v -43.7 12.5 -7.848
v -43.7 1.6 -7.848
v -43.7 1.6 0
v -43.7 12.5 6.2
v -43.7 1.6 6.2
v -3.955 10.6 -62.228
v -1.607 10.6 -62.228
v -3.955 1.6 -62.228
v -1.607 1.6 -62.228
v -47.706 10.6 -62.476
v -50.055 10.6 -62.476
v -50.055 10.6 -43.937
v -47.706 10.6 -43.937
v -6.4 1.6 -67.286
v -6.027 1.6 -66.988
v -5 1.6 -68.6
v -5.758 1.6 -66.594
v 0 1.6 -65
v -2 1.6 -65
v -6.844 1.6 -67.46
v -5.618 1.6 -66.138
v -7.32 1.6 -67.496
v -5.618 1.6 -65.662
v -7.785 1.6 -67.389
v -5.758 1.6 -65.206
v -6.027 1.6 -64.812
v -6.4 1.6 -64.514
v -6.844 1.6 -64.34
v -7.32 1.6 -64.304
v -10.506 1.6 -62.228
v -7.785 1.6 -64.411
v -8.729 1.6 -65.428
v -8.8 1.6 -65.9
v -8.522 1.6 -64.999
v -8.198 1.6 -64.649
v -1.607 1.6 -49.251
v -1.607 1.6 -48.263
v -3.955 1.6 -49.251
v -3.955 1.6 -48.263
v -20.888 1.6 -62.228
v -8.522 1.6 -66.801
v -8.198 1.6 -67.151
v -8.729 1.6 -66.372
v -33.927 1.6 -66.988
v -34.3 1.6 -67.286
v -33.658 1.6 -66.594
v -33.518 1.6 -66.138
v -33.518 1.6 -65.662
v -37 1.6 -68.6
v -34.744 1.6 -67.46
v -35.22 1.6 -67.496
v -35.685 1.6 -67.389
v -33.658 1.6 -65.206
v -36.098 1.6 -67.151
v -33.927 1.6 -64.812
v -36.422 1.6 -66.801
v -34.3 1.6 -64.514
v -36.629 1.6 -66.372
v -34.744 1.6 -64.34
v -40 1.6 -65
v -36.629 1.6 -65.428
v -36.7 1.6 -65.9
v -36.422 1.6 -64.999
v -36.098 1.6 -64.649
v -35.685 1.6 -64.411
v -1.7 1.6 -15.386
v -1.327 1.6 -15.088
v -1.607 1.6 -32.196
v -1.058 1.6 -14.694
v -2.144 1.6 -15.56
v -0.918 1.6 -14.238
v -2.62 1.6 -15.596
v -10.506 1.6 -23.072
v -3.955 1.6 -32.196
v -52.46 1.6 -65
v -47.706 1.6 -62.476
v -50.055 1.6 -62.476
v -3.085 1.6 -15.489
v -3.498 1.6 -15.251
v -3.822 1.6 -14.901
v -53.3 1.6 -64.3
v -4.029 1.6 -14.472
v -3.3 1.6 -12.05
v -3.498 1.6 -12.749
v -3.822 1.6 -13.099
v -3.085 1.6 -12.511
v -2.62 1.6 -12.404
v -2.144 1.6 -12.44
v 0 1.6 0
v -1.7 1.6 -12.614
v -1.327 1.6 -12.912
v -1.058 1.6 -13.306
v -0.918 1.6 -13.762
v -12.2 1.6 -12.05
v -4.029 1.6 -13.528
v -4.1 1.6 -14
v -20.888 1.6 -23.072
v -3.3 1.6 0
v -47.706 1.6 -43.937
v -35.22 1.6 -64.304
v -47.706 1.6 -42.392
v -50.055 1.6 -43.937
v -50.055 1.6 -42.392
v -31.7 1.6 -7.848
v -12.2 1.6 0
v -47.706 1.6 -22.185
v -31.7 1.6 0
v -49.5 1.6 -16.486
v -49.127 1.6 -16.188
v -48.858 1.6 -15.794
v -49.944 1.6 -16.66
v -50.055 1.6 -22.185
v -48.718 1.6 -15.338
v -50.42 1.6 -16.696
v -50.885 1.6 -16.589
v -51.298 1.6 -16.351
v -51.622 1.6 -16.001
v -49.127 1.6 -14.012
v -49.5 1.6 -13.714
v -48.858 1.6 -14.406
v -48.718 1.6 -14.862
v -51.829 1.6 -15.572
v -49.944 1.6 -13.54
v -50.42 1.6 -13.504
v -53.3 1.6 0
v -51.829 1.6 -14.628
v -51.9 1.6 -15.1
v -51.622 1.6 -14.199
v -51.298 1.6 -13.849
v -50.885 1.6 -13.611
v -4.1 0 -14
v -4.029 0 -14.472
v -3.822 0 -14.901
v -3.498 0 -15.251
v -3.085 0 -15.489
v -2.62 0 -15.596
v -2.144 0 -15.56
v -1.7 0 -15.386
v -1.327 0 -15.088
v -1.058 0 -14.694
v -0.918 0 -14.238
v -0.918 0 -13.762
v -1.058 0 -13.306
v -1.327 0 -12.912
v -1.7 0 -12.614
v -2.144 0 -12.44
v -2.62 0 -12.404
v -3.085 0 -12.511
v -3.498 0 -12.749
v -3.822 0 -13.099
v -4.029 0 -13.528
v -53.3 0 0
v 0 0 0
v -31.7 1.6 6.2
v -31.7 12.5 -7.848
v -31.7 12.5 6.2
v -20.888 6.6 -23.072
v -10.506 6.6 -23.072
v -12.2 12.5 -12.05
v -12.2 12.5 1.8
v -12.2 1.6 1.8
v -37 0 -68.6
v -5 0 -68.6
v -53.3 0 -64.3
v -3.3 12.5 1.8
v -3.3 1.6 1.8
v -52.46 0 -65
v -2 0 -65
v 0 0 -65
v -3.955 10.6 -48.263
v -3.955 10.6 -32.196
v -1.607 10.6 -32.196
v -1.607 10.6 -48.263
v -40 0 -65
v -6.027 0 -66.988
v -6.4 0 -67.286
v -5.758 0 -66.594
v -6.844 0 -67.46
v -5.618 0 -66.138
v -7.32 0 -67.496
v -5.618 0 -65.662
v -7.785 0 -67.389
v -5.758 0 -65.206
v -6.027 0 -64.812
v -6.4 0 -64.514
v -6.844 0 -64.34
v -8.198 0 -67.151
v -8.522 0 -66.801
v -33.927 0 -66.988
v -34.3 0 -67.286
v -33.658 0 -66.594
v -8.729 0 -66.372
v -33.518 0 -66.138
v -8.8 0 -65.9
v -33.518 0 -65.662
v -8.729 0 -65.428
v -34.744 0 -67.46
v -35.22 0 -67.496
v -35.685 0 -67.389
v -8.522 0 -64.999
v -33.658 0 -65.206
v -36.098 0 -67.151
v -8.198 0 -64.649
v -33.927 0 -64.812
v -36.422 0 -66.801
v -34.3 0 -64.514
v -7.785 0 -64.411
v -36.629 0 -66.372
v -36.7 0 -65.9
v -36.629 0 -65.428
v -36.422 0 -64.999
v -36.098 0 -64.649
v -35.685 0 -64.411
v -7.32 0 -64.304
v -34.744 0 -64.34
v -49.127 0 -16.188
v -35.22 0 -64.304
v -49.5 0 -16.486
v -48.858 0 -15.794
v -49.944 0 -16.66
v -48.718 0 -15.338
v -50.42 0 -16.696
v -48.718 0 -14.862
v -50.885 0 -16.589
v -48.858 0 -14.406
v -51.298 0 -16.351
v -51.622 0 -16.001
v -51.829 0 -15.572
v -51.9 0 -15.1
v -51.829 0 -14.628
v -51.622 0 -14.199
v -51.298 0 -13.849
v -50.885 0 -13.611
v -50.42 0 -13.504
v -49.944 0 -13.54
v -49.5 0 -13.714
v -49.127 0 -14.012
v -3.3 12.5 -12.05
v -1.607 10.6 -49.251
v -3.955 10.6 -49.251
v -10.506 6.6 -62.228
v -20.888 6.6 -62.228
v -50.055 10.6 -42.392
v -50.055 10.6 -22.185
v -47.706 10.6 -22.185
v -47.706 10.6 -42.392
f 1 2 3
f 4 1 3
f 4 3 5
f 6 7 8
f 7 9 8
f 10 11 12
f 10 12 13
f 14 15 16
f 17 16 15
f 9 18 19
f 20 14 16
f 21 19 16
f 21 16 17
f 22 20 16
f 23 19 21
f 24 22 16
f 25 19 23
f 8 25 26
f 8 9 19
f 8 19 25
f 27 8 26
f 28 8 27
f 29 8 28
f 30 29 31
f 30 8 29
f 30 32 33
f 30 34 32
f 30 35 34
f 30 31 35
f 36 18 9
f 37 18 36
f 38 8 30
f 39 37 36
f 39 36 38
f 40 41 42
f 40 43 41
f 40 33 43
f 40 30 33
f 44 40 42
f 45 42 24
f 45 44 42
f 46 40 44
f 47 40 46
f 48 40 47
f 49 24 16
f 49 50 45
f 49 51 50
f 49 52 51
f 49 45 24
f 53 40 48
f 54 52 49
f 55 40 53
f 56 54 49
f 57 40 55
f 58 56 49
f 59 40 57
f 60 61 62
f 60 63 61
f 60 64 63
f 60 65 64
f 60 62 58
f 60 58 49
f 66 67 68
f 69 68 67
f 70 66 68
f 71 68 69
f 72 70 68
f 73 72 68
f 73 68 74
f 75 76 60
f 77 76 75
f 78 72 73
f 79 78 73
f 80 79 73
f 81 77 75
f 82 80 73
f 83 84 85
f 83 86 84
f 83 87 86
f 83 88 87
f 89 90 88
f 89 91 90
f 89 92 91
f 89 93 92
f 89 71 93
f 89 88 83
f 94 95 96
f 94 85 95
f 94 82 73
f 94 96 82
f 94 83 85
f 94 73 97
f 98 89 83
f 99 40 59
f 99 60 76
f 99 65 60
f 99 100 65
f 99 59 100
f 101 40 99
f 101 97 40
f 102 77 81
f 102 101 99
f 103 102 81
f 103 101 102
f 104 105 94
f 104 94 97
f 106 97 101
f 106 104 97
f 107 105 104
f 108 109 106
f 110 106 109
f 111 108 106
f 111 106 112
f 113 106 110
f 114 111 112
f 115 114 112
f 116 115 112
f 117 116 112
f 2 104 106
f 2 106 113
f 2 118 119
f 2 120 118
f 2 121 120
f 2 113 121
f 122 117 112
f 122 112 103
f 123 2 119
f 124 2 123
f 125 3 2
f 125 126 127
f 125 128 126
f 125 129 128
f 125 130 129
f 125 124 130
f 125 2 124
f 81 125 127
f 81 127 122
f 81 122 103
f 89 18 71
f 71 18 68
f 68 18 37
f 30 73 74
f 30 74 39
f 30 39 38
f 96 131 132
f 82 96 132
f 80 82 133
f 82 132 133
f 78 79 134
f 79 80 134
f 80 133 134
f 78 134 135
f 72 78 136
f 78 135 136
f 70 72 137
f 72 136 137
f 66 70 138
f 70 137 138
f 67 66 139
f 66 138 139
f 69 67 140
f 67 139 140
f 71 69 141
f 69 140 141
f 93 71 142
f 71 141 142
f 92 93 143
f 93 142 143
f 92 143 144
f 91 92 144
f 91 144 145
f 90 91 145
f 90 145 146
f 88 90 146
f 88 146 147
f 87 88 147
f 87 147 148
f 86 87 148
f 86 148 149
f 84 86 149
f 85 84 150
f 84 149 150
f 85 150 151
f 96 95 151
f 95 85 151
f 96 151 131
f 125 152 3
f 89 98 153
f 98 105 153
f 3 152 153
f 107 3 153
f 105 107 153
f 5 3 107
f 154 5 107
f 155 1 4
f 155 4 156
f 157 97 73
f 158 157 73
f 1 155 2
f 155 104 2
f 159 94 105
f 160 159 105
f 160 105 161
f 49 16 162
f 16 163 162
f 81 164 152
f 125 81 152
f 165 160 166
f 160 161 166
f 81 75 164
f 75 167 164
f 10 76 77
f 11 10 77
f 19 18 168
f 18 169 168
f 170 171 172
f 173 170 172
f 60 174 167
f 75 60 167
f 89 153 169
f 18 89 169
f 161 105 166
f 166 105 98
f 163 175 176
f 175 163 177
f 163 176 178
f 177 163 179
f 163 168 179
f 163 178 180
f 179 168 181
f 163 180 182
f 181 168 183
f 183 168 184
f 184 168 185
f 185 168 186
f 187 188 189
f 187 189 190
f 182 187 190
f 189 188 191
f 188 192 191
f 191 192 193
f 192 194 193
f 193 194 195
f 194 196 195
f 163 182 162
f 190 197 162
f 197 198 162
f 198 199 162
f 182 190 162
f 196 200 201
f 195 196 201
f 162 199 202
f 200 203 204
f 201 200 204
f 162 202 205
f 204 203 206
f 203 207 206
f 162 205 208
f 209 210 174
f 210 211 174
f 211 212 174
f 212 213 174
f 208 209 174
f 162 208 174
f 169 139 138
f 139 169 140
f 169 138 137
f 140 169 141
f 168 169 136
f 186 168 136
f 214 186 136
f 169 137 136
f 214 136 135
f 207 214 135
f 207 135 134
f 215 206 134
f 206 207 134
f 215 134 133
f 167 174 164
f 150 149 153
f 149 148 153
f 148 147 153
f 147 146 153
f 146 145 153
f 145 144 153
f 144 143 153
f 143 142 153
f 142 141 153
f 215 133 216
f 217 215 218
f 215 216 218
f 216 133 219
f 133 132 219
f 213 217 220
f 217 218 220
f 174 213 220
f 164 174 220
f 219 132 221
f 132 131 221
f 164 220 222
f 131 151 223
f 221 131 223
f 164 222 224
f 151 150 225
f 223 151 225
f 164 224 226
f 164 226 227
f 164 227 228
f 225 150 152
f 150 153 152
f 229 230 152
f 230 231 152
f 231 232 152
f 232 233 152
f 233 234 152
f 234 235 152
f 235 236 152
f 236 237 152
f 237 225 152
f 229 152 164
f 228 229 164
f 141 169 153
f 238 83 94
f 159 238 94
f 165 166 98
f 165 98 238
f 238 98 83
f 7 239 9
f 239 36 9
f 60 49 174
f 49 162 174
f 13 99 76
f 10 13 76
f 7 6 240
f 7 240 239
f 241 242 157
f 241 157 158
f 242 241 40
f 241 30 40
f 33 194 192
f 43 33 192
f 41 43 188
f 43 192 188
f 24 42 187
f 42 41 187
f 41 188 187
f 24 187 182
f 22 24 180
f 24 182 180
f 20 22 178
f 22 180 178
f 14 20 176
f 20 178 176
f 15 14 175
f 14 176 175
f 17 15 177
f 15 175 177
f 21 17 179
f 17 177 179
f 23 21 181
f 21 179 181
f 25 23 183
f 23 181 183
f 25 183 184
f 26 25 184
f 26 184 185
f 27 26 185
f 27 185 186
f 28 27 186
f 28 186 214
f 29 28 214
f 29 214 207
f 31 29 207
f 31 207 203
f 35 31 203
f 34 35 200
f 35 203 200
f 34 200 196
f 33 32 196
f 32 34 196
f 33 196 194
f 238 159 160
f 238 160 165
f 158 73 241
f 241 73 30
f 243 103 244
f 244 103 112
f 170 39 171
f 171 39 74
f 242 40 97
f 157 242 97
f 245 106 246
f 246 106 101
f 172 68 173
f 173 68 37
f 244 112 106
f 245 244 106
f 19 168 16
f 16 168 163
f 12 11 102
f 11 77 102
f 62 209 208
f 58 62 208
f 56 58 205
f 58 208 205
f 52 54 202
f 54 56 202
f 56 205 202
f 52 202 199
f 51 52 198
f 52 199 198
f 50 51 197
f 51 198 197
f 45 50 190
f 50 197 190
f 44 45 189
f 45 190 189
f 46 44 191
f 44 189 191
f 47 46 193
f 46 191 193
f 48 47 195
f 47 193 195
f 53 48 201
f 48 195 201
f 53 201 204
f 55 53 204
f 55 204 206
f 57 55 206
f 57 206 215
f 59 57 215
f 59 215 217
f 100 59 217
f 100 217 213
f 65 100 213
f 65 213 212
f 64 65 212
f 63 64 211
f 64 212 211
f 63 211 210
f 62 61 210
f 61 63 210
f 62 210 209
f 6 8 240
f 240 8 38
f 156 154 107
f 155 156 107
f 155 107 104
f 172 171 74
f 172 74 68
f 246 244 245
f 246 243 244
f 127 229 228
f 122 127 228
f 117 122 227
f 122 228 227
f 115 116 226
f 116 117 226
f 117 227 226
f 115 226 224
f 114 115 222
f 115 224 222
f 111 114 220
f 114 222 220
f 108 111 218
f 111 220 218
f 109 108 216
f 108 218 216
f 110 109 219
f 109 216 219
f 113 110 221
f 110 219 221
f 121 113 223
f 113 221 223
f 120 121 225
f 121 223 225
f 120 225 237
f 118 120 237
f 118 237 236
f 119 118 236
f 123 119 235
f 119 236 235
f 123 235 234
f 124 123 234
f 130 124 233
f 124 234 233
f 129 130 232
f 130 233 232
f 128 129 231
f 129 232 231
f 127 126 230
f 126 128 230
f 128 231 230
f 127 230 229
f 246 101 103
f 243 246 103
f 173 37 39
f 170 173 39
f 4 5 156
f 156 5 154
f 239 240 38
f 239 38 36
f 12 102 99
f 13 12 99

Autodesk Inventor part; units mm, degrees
ref_plane "YZ Plane" through (0, 0, 0) normal (1, 0, 0) x (0, 1, 0)
ref_plane "XZ Plane" through (0, 0, 0) normal (0, 1, 0) x (-1, 0, 0)
ref_plane "XY Plane" through (0, 0, 0) normal (0, 0, 1) x (1, 0, 0)
sketch "Sketch1" plane through (0, 0, 0) normal (0, 1, 0) x (-1, 0, 0)
  line L0 (53.3, 0) -> (0, 0)
  line L1 (0, 0) -> (0, -65)
  line L2 (0, -65) -> (2, -65)
  line L3 (2, -65) -> (5, -68.6)
  line L4 (5, -68.6) -> (37, -68.6)
  line L5 (37, -68.6) -> (40, -65)
  line L6 (40, -65) -> (52.46, -65)
  line L7 (52.46, -65) -> (53.3, -64.3)
  line L8 (53.3, -64.3) -> (53.3, 0)
  line L9 (63.96, 0) -> (-10.66, 0) projected
  line L10 (0, -82.32) -> (0, 13.72) projected
  circle A0 centre (50.3, -15.1) radius 1.6
  circle A1 centre (2.5, -14) radius 1.6
  circle A2 centre (35.1, -65.9) radius 1.6
  circle A3 centre (7.2, -65.9) radius 1.6
  dimension "d2" = 53.3
  dimension "d5" = 51.9
  dimension "d6" = 1.1
  dimension "d8" = 27.9
  dimension "d9" = 15.2
  dimension "d10" = 68.6
  dimension "d11" = 3.2
  dimension "d12" = 50.8
  dimension "d13" = 4.7
  dimension "d15" = 2.5
  dimension "d17" = 14
  dimension "d18" = 37
  dimension "d19" = 40
  dimension "d20" = 2
  dimension "d21" = 5
  dimension "d22" = 65
extrude "board" add sketch "Sketch1" along normal blind 1.6
sketch "Sketch2" plane through (0, 1.6, 0) normal (0, 1, 0) x (1, 0, 0)
  line L0 (-43.7, -6.2) -> (-31.7, -6.2)
  line L1 (-31.7, -6.2) -> (-31.7, 7.8481)
  line L2 (-31.7, 7.8481) -> (-43.7, 7.8481)
  line L3 (-43.7, 7.8481) -> (-43.7, -6.2)
  line L4 (-12.2, -1.8) -> (-3.3, -1.8)
  line L5 (-3.3, -1.8) -> (-3.3, 12.0502)
  line L6 (-3.3, 12.0502) -> (-12.2, 12.0502)
  line L7 (-12.2, 12.0502) -> (-12.2, -1.8)
  line L8 (-50.0547, 22.1848) -> (-47.7065, 22.1848)
  line L9 (-47.7065, 22.1848) -> (-47.7065, 42.392)
  line L10 (-47.7065, 42.392) -> (-50.0547, 42.392)
  line L11 (-50.0547, 42.392) -> (-50.0547, 22.1848)
  line L12 (-50.0547, 43.9369) -> (-47.7065, 43.9369)
  line L13 (-47.7065, 43.9369) -> (-47.7065, 62.4757)
  line L14 (-47.7065, 62.4757) -> (-50.0547, 62.4757)
  line L15 (-50.0547, 62.4757) -> (-50.0547, 43.9369)
  line L16 (-3.9549, 32.1957) -> (-1.6067, 32.1957)
  line L17 (-1.6067, 32.1957) -> (-1.6067, 48.2627)
  line L18 (-1.6067, 48.2627) -> (-3.9549, 48.2627)
  line L19 (-3.9549, 48.2627) -> (-3.9549, 32.1957)
  line L20 (-3.9549, 49.2514) -> (-1.6067, 49.2514)
  line L21 (-1.6067, 49.2514) -> (-1.6067, 62.2285)
  line L22 (-1.6067, 62.2285) -> (-3.9549, 62.2285)
  line L23 (-3.9549, 62.2285) -> (-3.9549, 49.2514)
  line L24 (-53.3, 64.3) -> (-53.3, 0) projected
  line L25 (0, 0) -> (0, 65) projected
  line L26 (-53.3, 0) -> (0, 0) projected
  line L27 (-20.8879, 23.0716) -> (-10.5062, 23.0716)
  line L28 (-10.5062, 23.0716) -> (-10.5062, 62.2285)
  line L29 (-10.5062, 62.2285) -> (-20.8879, 62.2285)
  line L30 (-20.8879, 62.2285) -> (-20.8879, 23.0716)
  dimension "d25" = 9.6
  dimension "d26" = 12
  dimension "d27" = 3.3
  dimension "d28" = 8.9
  dimension "d29" = 1.8
  dimension "d30" = 6.2
extrude "Extrusion2" add sketch "Sketch2" along normal blind 10.9 contours L3 L26 L1 L0 | L7 L6 L5 L26 | L26 L5 L4 L7 | L3 L2 L1 L26
extrude "Extrusion3" add sketch "Sketch2" along normal blind 5 contours L30 L29 L28 L27
extrude "Extrusion4" add sketch "Sketch2" along normal blind 9 contours L11 L10 L9 L8 | L15 L14 L13 L12 | L19 L18 L17 L16 | L23 L22 L21 L20
properties part number "arduino_uno"
